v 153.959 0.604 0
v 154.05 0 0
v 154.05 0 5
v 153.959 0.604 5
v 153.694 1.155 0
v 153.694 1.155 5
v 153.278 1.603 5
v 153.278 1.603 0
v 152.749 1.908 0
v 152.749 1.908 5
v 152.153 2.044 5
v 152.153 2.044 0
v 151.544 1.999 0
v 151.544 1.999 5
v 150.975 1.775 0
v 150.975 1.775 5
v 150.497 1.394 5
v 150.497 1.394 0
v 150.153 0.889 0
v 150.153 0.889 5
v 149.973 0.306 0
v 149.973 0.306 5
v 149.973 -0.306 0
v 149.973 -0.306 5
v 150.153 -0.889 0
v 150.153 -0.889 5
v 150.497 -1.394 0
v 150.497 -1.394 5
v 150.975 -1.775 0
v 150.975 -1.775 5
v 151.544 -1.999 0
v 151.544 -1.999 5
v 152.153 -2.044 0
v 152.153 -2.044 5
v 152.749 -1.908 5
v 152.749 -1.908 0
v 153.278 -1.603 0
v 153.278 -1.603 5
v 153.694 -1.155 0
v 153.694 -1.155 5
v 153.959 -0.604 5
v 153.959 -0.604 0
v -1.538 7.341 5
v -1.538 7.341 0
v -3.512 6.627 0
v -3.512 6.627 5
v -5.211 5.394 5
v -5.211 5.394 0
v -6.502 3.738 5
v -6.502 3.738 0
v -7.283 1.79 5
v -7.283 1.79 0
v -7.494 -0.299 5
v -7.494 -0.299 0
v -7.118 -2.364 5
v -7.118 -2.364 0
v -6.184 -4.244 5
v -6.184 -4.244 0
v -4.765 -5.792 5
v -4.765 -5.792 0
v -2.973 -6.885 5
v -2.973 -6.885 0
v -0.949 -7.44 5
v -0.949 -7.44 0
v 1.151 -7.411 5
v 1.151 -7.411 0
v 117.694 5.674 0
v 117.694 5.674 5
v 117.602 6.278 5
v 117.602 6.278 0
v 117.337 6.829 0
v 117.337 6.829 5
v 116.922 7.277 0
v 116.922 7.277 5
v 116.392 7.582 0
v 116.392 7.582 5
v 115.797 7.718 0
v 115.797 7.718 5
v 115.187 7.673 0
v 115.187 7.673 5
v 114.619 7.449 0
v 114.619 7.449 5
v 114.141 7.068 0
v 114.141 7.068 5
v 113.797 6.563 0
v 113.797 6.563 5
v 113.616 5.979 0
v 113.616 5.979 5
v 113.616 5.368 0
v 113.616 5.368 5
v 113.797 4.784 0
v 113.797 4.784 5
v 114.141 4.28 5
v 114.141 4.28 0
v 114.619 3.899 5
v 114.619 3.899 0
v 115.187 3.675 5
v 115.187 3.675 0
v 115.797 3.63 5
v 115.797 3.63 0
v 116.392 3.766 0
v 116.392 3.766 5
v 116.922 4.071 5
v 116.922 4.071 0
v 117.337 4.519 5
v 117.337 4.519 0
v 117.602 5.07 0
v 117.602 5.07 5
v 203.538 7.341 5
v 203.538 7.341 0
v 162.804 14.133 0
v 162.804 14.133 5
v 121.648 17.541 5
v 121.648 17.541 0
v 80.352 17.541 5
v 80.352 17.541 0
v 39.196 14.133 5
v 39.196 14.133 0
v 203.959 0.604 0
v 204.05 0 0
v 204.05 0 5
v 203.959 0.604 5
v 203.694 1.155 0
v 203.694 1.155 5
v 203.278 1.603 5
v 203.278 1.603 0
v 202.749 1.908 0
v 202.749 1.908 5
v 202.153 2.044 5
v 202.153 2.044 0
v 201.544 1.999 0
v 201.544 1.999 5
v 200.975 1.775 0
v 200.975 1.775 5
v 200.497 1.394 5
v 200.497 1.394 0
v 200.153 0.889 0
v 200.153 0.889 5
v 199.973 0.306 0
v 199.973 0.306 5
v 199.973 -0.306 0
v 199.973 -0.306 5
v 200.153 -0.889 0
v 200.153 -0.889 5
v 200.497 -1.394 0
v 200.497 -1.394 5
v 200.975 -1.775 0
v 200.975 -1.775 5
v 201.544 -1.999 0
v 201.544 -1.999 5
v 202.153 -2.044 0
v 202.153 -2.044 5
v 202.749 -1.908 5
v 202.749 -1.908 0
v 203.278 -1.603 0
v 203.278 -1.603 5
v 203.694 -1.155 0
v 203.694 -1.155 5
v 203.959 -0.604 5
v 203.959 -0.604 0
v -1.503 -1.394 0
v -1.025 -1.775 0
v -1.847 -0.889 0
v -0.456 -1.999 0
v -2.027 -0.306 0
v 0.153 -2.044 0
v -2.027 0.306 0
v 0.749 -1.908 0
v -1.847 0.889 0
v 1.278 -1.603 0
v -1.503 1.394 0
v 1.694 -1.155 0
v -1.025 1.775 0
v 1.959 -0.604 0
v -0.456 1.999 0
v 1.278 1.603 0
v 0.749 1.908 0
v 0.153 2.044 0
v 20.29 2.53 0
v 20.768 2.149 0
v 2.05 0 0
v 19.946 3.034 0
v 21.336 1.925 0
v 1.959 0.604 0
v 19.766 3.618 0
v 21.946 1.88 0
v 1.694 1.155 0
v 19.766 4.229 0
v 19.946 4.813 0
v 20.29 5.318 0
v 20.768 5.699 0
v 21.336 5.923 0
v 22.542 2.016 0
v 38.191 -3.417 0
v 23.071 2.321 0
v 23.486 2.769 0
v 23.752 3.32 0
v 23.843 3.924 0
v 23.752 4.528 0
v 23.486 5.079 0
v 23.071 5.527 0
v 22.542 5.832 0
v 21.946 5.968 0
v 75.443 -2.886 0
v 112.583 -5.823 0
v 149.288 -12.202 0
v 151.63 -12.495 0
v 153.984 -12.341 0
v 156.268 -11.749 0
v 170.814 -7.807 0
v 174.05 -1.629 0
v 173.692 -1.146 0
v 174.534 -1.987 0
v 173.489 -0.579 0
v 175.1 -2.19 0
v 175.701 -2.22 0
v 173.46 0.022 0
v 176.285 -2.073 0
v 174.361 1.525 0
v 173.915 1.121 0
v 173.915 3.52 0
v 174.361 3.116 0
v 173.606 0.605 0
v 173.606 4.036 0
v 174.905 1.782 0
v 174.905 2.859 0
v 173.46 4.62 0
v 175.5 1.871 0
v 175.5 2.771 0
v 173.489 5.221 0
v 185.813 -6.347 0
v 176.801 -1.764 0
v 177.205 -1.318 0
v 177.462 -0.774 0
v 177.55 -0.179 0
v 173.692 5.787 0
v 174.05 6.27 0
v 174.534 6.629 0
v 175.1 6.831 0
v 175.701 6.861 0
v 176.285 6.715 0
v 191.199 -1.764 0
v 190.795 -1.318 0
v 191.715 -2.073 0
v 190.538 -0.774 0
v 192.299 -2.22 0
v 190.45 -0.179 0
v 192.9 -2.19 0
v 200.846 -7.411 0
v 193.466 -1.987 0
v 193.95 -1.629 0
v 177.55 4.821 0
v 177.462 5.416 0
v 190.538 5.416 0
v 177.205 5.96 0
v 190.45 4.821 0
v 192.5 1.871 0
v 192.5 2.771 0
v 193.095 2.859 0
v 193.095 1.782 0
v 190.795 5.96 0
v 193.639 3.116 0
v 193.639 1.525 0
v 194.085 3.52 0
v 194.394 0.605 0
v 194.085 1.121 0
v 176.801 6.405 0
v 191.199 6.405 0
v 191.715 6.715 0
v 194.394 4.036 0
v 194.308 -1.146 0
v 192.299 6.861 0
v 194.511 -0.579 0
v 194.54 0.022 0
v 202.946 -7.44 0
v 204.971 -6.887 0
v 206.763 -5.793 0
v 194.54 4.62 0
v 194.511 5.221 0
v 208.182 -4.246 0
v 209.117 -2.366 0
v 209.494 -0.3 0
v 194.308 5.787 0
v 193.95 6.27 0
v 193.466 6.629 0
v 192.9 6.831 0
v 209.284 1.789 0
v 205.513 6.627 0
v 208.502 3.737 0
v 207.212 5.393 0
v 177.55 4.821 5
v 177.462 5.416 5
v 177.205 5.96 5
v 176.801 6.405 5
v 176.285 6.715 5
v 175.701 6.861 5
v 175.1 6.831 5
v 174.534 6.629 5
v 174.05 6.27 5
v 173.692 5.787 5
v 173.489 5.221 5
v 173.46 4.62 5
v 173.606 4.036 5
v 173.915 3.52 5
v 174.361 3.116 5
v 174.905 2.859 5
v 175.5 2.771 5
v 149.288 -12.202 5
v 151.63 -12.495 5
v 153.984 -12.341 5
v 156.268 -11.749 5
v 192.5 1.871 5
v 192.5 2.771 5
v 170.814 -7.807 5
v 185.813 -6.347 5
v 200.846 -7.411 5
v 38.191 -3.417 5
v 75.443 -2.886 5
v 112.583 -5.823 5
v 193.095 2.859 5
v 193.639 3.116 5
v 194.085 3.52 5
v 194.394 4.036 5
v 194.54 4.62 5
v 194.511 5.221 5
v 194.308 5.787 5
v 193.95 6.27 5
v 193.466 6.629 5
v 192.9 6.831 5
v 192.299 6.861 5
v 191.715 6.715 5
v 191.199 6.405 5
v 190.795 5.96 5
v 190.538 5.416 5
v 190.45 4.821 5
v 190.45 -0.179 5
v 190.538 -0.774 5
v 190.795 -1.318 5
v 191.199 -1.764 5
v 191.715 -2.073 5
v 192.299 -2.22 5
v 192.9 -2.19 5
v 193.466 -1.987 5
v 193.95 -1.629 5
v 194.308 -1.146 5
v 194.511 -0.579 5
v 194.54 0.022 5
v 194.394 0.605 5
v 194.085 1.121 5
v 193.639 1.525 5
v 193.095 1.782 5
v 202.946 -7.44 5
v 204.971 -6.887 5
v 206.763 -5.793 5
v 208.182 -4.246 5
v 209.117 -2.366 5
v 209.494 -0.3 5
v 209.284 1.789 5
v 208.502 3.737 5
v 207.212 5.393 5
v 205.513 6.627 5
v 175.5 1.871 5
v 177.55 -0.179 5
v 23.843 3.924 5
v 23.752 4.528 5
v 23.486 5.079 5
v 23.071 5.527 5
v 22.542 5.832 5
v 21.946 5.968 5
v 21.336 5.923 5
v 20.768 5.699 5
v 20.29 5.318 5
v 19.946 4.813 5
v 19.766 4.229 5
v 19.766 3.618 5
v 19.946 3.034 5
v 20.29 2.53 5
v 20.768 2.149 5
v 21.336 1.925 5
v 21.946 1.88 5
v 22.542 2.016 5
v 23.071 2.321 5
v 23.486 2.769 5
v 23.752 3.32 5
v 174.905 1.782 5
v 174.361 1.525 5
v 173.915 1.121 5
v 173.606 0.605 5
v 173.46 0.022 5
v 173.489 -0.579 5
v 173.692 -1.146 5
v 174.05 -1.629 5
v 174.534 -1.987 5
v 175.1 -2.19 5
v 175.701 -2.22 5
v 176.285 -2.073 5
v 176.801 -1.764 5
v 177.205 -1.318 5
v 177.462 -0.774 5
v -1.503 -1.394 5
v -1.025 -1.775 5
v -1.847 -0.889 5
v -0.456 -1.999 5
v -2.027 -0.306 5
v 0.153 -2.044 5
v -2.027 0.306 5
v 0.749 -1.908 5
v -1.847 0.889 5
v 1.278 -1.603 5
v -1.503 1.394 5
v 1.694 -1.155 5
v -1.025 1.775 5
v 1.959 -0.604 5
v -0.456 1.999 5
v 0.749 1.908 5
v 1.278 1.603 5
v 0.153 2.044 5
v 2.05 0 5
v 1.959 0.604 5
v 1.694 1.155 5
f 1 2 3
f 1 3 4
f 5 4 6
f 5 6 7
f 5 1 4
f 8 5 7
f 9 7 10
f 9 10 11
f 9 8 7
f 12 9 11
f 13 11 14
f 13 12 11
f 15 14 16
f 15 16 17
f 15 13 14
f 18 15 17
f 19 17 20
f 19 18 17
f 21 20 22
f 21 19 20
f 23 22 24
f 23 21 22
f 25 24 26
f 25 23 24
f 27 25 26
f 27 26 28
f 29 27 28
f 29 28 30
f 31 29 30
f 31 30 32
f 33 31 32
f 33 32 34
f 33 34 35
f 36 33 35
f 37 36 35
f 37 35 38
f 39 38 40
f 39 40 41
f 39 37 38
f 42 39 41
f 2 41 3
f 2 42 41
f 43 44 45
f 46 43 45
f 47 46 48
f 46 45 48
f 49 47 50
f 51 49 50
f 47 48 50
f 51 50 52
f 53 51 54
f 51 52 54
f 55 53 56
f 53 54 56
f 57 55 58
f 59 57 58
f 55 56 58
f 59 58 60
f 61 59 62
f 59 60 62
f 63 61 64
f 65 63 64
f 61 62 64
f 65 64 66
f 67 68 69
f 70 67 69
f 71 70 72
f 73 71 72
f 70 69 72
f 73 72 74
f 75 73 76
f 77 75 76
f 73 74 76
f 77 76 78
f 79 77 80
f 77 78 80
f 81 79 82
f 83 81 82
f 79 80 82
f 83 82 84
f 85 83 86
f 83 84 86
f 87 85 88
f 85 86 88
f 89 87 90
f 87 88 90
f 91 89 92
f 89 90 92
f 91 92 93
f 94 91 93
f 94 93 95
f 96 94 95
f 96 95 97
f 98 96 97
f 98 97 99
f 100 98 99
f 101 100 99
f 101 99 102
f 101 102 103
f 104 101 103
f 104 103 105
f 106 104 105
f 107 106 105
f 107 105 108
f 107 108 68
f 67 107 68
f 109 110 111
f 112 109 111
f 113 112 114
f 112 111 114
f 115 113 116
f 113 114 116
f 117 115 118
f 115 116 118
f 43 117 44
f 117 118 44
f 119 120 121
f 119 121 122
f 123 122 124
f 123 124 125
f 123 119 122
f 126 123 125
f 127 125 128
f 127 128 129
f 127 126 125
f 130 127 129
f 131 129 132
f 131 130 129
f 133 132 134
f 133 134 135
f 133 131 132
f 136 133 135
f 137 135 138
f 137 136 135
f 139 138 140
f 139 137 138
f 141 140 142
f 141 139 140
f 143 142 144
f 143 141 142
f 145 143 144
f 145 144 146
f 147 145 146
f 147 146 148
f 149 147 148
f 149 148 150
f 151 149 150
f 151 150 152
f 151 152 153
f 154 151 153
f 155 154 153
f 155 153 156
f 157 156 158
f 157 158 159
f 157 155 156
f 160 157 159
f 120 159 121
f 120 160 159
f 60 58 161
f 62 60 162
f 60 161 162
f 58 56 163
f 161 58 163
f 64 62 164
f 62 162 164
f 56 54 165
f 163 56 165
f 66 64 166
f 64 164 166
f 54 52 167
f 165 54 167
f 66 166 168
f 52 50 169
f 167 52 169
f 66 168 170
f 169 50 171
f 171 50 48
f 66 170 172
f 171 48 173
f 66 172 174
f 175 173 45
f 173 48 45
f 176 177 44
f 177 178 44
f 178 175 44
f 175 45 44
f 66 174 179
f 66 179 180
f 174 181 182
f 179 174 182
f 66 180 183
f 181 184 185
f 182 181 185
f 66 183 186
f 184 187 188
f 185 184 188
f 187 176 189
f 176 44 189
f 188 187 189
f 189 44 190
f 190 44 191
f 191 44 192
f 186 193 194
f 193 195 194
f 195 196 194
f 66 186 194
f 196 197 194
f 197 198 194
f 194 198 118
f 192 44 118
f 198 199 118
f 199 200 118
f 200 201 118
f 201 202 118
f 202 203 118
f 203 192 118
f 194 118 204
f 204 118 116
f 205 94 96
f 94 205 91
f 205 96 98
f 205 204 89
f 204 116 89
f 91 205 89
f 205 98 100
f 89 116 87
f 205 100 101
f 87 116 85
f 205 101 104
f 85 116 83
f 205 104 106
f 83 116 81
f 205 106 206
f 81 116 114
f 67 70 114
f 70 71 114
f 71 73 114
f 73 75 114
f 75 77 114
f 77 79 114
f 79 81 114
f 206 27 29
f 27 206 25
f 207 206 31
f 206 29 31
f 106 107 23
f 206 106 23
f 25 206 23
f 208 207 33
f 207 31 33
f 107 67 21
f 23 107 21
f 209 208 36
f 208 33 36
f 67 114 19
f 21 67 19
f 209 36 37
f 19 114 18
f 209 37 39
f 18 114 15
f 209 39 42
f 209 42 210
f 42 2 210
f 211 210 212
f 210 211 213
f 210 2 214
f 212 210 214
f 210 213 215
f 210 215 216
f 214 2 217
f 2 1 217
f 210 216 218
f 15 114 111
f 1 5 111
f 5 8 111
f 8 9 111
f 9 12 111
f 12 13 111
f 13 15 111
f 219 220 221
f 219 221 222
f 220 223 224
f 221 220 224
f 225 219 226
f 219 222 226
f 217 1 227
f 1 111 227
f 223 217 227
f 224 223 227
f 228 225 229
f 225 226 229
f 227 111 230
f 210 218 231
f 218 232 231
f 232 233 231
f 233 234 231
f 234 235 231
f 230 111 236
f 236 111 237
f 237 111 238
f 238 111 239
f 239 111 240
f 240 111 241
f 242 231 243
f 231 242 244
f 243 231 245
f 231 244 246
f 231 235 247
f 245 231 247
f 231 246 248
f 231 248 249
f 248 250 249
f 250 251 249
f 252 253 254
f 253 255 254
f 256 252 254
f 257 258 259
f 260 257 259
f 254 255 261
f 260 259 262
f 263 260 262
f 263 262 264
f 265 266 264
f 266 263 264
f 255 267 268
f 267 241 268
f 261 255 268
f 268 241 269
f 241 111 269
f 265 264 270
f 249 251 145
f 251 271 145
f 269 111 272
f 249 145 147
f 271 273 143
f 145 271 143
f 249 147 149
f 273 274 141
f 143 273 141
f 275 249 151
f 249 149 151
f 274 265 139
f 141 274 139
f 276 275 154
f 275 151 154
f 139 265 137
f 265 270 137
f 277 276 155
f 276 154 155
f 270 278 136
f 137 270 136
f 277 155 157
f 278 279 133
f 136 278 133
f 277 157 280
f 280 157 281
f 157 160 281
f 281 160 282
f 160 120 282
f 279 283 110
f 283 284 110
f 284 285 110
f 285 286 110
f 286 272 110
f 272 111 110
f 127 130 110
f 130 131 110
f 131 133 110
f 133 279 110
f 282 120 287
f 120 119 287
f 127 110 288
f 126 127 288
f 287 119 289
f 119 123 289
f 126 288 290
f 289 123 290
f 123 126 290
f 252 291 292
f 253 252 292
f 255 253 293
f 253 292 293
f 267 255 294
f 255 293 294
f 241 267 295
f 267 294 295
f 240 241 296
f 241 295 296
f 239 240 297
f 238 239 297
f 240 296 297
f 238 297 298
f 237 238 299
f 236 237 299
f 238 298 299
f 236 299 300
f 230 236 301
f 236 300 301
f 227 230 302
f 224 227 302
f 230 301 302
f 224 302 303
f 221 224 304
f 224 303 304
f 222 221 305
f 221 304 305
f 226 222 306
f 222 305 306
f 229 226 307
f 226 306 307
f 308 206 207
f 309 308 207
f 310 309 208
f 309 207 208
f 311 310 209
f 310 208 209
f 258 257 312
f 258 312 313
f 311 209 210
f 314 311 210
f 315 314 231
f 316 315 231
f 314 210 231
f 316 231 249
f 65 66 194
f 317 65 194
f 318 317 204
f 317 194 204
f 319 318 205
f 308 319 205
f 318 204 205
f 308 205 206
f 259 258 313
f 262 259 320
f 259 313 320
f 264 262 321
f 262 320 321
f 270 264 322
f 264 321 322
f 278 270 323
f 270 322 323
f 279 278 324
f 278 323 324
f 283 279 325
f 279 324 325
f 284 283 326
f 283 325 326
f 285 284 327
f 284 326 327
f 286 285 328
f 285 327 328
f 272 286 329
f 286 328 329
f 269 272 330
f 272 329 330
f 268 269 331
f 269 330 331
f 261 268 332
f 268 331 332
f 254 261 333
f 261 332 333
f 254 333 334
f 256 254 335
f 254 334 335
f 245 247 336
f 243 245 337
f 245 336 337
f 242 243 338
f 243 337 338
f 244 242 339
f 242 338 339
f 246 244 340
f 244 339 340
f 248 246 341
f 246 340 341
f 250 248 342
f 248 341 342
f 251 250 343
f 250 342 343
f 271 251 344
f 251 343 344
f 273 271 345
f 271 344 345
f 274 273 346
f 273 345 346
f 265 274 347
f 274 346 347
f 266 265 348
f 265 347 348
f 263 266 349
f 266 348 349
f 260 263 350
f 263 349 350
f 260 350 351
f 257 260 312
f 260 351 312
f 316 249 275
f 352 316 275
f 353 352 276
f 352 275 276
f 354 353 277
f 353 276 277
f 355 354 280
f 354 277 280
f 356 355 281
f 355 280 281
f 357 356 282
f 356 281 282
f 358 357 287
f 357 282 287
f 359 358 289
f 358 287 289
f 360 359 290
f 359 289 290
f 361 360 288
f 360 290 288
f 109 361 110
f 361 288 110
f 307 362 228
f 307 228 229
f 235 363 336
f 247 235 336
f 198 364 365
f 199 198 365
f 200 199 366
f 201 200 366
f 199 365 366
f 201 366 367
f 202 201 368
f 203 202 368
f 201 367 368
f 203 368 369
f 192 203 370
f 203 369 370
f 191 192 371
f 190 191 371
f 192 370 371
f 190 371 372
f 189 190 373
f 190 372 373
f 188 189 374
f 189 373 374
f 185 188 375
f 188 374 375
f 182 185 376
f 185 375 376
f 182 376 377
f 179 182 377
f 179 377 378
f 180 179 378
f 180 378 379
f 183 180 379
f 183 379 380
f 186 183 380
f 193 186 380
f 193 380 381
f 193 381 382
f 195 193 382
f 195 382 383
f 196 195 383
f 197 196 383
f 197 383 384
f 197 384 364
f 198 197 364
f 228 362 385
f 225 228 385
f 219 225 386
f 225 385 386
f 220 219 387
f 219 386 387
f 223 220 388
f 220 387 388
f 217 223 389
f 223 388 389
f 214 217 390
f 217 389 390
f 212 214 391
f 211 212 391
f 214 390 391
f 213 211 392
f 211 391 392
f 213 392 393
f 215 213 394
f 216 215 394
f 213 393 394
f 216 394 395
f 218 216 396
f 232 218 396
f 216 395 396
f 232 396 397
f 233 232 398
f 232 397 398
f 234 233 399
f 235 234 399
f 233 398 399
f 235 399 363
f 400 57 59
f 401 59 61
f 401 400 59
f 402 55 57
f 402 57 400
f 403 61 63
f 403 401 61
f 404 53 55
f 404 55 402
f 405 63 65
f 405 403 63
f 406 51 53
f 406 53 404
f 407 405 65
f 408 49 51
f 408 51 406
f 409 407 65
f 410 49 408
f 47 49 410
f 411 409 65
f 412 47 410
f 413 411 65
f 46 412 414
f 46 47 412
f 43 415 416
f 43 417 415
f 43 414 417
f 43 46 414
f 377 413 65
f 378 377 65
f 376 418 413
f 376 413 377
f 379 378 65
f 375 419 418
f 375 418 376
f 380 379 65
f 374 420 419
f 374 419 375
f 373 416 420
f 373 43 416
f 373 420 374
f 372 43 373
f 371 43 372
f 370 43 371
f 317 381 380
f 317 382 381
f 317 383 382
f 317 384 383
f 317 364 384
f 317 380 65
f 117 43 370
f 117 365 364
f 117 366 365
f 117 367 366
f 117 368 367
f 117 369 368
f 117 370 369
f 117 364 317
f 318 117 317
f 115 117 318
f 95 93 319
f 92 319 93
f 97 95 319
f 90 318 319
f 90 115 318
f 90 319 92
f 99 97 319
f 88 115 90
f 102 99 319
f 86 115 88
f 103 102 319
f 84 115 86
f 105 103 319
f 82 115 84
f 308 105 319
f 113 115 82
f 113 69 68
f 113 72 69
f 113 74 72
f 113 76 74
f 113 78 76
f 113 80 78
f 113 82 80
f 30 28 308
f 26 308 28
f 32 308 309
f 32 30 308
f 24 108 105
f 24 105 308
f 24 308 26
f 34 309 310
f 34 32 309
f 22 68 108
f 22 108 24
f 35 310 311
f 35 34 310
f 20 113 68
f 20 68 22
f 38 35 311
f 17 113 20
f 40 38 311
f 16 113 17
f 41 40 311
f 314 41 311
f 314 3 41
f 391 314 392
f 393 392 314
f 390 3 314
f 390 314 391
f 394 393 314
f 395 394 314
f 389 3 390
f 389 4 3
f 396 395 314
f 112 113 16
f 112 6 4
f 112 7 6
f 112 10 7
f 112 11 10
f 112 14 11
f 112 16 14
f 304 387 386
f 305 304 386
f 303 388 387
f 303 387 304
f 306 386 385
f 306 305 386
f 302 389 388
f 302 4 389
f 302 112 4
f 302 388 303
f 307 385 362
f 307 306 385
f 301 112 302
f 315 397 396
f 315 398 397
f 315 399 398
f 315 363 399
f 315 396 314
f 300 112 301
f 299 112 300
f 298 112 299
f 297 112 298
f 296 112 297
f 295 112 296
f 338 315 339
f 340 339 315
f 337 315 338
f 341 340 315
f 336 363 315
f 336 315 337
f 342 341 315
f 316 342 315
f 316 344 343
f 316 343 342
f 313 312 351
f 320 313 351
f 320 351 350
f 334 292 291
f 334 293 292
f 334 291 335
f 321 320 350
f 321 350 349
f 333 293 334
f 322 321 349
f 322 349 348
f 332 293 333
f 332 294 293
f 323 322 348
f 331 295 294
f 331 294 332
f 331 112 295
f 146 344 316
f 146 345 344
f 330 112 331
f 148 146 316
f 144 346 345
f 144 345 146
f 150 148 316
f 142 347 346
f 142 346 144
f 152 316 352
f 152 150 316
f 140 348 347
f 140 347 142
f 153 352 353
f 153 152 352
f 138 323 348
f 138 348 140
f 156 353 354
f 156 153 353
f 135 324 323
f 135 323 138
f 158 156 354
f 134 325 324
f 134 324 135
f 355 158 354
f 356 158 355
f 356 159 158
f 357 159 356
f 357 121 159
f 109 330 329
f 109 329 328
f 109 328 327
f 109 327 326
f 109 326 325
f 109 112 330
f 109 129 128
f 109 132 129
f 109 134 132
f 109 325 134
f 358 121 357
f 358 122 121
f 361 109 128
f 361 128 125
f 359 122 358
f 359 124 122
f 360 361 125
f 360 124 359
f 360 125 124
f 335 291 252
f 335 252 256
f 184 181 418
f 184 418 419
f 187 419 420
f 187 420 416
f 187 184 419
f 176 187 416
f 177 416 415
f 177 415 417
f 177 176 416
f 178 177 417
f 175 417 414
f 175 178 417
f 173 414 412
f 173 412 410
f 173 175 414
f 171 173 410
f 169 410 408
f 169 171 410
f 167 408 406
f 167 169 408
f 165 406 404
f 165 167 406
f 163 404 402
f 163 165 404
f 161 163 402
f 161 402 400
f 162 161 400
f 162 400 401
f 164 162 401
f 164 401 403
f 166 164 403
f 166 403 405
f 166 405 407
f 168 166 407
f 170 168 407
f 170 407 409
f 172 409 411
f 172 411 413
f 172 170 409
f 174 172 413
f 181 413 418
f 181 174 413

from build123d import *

# Parameters (mm, degrees)
SCHIZZO1_R                   = 2.05
ESTRUSIONE_ESTRUSIONE1_DEPTH = 5
SCHIZZO2_R                   = 2.05
TAGLIO_ESTRUSIONE1_DEPTH     = 10
CUT_EXTRUDE1_REACH           = 7
SKETCH1_W                    = 17
SKETCH1_H                    = 5
CUT_EXTRUDE2_REACH           = 7
SKETCH2_R                    = 2.05


with BuildPart() as part:
    # Schizzo1 → Estrusione-Estrusione1 (new body)
    with BuildSketch(Plane.XY):
        with BuildLine():
            ThreePointArc((-1.538071066, 7.340595166), (-7.378454008, -1.344773756), (1.150548918, -7.411223731))
            ThreePointArc((1.150548918, -7.411223731), (75.443261143, -2.885528453), (149.288277512, -12.20231786))
            ThreePointArc((149.288277512, -12.20231786), (152.810661847, -12.473685396), (156.268292683, -11.748688334))
            ThreePointArc((156.268292683, -11.748688334), (178.283063002, -6.762377854), (200.846153846, -7.410711103))
            ThreePointArc((200.846153846, -7.410711103), (209.378154672, -1.346415107), (203.538071066, 7.340595166))
            ThreePointArc((203.538071066, 7.340595166), (101, 17.967584078), (-1.538071066, 7.340595166))
        make_face()
        Circle(SCHIZZO1_R, mode=Mode.SUBTRACT)
        with Locations((202, 0)):
            Circle(SCHIZZO1_R, mode=Mode.SUBTRACT)
        with Locations((152, 0)):
            Circle(SCHIZZO1_R, mode=Mode.SUBTRACT)
    extrude(amount=ESTRUSIONE_ESTRUSIONE1_DEPTH)

    # Schizzo2 → Taglio-Estrusione1 (cut)
    with BuildSketch(Plane.XY.offset(5)):
        with Locations((21.792647349, 3.923925867)):
            Circle(SCHIZZO2_R)
        with Locations((115.643522851, 5.673925867)):
            Circle(SCHIZZO2_R)
    extrude(amount=-TAGLIO_ESTRUSIONE1_DEPTH, mode=Mode.SUBTRACT)

    # Sketch1 → Cut-Extrude1 (cut, up to next)
    with BuildSketch(Plane.XY.offset(5), mode=Mode.PRIVATE) as cut_extrude1_sk1:
        with Locations((184, 2.320601078)):
            Rectangle(SKETCH1_W, SKETCH1_H)
    cut_extrude1_tool1 = extrude(cut_extrude1_sk1.sketch, amount=-CUT_EXTRUDE1_REACH, mode=Mode.PRIVATE) & part.part
    add(cut_extrude1_tool1.solids().sort_by_distance((184, 2.320601, 5))[0], mode=Mode.SUBTRACT)

    # Sketch2 → Cut-Extrude2 (cut, up to next)
    with BuildSketch(Plane.XY.offset(5), mode=Mode.PRIVATE) as cut_extrude2_sk1:
        with Locations((175.5, 4.820601078)):
            Circle(SKETCH2_R)
    cut_extrude2_tool1 = extrude(cut_extrude2_sk1.sketch, amount=-CUT_EXTRUDE2_REACH, mode=Mode.PRIVATE) & part.part
    add(cut_extrude2_tool1.solids().sort_by_distance((175.5, 4.820601, 5))[0], mode=Mode.SUBTRACT)
    # Sketch2 → Cut-Extrude2 (cut, up to next)
    with BuildSketch(Plane.XY.offset(5), mode=Mode.PRIVATE) as cut_extrude2_sk2:
        with Locations((175.5, -0.179398922)):
            Circle(SKETCH2_R)
    cut_extrude2_tool2 = extrude(cut_extrude2_sk2.sketch, amount=-CUT_EXTRUDE2_REACH, mode=Mode.PRIVATE) & part.part
    add(cut_extrude2_tool2.solids().sort_by_distance((175.5, -0.179399, 5))[0], mode=Mode.SUBTRACT)
    # Sketch2 → Cut-Extrude2 (cut, up to next)
    with BuildSketch(Plane.XY.offset(5), mode=Mode.PRIVATE) as cut_extrude2_sk3:
        with Locations((192.5, -0.179398922)):
            Circle(SKETCH2_R)
    cut_extrude2_tool3 = extrude(cut_extrude2_sk3.sketch, amount=-CUT_EXTRUDE2_REACH, mode=Mode.PRIVATE) & part.part
    add(cut_extrude2_tool3.solids().sort_by_distance((192.5, -0.179399, 5))[0], mode=Mode.SUBTRACT)
    # Sketch2 → Cut-Extrude2 (cut, up to next)
    with BuildSketch(Plane.XY.offset(5), mode=Mode.PRIVATE) as cut_extrude2_sk4:
        with Locations((192.5, 4.820601078)):
            Circle(SKETCH2_R)
    cut_extrude2_tool4 = extrude(cut_extrude2_sk4.sketch, amount=-CUT_EXTRUDE2_REACH, mode=Mode.PRIVATE) & part.part
    add(cut_extrude2_tool4.solids().sort_by_distance((192.5, 4.820601, 5))[0], mode=Mode.SUBTRACT)


solid = part.part
